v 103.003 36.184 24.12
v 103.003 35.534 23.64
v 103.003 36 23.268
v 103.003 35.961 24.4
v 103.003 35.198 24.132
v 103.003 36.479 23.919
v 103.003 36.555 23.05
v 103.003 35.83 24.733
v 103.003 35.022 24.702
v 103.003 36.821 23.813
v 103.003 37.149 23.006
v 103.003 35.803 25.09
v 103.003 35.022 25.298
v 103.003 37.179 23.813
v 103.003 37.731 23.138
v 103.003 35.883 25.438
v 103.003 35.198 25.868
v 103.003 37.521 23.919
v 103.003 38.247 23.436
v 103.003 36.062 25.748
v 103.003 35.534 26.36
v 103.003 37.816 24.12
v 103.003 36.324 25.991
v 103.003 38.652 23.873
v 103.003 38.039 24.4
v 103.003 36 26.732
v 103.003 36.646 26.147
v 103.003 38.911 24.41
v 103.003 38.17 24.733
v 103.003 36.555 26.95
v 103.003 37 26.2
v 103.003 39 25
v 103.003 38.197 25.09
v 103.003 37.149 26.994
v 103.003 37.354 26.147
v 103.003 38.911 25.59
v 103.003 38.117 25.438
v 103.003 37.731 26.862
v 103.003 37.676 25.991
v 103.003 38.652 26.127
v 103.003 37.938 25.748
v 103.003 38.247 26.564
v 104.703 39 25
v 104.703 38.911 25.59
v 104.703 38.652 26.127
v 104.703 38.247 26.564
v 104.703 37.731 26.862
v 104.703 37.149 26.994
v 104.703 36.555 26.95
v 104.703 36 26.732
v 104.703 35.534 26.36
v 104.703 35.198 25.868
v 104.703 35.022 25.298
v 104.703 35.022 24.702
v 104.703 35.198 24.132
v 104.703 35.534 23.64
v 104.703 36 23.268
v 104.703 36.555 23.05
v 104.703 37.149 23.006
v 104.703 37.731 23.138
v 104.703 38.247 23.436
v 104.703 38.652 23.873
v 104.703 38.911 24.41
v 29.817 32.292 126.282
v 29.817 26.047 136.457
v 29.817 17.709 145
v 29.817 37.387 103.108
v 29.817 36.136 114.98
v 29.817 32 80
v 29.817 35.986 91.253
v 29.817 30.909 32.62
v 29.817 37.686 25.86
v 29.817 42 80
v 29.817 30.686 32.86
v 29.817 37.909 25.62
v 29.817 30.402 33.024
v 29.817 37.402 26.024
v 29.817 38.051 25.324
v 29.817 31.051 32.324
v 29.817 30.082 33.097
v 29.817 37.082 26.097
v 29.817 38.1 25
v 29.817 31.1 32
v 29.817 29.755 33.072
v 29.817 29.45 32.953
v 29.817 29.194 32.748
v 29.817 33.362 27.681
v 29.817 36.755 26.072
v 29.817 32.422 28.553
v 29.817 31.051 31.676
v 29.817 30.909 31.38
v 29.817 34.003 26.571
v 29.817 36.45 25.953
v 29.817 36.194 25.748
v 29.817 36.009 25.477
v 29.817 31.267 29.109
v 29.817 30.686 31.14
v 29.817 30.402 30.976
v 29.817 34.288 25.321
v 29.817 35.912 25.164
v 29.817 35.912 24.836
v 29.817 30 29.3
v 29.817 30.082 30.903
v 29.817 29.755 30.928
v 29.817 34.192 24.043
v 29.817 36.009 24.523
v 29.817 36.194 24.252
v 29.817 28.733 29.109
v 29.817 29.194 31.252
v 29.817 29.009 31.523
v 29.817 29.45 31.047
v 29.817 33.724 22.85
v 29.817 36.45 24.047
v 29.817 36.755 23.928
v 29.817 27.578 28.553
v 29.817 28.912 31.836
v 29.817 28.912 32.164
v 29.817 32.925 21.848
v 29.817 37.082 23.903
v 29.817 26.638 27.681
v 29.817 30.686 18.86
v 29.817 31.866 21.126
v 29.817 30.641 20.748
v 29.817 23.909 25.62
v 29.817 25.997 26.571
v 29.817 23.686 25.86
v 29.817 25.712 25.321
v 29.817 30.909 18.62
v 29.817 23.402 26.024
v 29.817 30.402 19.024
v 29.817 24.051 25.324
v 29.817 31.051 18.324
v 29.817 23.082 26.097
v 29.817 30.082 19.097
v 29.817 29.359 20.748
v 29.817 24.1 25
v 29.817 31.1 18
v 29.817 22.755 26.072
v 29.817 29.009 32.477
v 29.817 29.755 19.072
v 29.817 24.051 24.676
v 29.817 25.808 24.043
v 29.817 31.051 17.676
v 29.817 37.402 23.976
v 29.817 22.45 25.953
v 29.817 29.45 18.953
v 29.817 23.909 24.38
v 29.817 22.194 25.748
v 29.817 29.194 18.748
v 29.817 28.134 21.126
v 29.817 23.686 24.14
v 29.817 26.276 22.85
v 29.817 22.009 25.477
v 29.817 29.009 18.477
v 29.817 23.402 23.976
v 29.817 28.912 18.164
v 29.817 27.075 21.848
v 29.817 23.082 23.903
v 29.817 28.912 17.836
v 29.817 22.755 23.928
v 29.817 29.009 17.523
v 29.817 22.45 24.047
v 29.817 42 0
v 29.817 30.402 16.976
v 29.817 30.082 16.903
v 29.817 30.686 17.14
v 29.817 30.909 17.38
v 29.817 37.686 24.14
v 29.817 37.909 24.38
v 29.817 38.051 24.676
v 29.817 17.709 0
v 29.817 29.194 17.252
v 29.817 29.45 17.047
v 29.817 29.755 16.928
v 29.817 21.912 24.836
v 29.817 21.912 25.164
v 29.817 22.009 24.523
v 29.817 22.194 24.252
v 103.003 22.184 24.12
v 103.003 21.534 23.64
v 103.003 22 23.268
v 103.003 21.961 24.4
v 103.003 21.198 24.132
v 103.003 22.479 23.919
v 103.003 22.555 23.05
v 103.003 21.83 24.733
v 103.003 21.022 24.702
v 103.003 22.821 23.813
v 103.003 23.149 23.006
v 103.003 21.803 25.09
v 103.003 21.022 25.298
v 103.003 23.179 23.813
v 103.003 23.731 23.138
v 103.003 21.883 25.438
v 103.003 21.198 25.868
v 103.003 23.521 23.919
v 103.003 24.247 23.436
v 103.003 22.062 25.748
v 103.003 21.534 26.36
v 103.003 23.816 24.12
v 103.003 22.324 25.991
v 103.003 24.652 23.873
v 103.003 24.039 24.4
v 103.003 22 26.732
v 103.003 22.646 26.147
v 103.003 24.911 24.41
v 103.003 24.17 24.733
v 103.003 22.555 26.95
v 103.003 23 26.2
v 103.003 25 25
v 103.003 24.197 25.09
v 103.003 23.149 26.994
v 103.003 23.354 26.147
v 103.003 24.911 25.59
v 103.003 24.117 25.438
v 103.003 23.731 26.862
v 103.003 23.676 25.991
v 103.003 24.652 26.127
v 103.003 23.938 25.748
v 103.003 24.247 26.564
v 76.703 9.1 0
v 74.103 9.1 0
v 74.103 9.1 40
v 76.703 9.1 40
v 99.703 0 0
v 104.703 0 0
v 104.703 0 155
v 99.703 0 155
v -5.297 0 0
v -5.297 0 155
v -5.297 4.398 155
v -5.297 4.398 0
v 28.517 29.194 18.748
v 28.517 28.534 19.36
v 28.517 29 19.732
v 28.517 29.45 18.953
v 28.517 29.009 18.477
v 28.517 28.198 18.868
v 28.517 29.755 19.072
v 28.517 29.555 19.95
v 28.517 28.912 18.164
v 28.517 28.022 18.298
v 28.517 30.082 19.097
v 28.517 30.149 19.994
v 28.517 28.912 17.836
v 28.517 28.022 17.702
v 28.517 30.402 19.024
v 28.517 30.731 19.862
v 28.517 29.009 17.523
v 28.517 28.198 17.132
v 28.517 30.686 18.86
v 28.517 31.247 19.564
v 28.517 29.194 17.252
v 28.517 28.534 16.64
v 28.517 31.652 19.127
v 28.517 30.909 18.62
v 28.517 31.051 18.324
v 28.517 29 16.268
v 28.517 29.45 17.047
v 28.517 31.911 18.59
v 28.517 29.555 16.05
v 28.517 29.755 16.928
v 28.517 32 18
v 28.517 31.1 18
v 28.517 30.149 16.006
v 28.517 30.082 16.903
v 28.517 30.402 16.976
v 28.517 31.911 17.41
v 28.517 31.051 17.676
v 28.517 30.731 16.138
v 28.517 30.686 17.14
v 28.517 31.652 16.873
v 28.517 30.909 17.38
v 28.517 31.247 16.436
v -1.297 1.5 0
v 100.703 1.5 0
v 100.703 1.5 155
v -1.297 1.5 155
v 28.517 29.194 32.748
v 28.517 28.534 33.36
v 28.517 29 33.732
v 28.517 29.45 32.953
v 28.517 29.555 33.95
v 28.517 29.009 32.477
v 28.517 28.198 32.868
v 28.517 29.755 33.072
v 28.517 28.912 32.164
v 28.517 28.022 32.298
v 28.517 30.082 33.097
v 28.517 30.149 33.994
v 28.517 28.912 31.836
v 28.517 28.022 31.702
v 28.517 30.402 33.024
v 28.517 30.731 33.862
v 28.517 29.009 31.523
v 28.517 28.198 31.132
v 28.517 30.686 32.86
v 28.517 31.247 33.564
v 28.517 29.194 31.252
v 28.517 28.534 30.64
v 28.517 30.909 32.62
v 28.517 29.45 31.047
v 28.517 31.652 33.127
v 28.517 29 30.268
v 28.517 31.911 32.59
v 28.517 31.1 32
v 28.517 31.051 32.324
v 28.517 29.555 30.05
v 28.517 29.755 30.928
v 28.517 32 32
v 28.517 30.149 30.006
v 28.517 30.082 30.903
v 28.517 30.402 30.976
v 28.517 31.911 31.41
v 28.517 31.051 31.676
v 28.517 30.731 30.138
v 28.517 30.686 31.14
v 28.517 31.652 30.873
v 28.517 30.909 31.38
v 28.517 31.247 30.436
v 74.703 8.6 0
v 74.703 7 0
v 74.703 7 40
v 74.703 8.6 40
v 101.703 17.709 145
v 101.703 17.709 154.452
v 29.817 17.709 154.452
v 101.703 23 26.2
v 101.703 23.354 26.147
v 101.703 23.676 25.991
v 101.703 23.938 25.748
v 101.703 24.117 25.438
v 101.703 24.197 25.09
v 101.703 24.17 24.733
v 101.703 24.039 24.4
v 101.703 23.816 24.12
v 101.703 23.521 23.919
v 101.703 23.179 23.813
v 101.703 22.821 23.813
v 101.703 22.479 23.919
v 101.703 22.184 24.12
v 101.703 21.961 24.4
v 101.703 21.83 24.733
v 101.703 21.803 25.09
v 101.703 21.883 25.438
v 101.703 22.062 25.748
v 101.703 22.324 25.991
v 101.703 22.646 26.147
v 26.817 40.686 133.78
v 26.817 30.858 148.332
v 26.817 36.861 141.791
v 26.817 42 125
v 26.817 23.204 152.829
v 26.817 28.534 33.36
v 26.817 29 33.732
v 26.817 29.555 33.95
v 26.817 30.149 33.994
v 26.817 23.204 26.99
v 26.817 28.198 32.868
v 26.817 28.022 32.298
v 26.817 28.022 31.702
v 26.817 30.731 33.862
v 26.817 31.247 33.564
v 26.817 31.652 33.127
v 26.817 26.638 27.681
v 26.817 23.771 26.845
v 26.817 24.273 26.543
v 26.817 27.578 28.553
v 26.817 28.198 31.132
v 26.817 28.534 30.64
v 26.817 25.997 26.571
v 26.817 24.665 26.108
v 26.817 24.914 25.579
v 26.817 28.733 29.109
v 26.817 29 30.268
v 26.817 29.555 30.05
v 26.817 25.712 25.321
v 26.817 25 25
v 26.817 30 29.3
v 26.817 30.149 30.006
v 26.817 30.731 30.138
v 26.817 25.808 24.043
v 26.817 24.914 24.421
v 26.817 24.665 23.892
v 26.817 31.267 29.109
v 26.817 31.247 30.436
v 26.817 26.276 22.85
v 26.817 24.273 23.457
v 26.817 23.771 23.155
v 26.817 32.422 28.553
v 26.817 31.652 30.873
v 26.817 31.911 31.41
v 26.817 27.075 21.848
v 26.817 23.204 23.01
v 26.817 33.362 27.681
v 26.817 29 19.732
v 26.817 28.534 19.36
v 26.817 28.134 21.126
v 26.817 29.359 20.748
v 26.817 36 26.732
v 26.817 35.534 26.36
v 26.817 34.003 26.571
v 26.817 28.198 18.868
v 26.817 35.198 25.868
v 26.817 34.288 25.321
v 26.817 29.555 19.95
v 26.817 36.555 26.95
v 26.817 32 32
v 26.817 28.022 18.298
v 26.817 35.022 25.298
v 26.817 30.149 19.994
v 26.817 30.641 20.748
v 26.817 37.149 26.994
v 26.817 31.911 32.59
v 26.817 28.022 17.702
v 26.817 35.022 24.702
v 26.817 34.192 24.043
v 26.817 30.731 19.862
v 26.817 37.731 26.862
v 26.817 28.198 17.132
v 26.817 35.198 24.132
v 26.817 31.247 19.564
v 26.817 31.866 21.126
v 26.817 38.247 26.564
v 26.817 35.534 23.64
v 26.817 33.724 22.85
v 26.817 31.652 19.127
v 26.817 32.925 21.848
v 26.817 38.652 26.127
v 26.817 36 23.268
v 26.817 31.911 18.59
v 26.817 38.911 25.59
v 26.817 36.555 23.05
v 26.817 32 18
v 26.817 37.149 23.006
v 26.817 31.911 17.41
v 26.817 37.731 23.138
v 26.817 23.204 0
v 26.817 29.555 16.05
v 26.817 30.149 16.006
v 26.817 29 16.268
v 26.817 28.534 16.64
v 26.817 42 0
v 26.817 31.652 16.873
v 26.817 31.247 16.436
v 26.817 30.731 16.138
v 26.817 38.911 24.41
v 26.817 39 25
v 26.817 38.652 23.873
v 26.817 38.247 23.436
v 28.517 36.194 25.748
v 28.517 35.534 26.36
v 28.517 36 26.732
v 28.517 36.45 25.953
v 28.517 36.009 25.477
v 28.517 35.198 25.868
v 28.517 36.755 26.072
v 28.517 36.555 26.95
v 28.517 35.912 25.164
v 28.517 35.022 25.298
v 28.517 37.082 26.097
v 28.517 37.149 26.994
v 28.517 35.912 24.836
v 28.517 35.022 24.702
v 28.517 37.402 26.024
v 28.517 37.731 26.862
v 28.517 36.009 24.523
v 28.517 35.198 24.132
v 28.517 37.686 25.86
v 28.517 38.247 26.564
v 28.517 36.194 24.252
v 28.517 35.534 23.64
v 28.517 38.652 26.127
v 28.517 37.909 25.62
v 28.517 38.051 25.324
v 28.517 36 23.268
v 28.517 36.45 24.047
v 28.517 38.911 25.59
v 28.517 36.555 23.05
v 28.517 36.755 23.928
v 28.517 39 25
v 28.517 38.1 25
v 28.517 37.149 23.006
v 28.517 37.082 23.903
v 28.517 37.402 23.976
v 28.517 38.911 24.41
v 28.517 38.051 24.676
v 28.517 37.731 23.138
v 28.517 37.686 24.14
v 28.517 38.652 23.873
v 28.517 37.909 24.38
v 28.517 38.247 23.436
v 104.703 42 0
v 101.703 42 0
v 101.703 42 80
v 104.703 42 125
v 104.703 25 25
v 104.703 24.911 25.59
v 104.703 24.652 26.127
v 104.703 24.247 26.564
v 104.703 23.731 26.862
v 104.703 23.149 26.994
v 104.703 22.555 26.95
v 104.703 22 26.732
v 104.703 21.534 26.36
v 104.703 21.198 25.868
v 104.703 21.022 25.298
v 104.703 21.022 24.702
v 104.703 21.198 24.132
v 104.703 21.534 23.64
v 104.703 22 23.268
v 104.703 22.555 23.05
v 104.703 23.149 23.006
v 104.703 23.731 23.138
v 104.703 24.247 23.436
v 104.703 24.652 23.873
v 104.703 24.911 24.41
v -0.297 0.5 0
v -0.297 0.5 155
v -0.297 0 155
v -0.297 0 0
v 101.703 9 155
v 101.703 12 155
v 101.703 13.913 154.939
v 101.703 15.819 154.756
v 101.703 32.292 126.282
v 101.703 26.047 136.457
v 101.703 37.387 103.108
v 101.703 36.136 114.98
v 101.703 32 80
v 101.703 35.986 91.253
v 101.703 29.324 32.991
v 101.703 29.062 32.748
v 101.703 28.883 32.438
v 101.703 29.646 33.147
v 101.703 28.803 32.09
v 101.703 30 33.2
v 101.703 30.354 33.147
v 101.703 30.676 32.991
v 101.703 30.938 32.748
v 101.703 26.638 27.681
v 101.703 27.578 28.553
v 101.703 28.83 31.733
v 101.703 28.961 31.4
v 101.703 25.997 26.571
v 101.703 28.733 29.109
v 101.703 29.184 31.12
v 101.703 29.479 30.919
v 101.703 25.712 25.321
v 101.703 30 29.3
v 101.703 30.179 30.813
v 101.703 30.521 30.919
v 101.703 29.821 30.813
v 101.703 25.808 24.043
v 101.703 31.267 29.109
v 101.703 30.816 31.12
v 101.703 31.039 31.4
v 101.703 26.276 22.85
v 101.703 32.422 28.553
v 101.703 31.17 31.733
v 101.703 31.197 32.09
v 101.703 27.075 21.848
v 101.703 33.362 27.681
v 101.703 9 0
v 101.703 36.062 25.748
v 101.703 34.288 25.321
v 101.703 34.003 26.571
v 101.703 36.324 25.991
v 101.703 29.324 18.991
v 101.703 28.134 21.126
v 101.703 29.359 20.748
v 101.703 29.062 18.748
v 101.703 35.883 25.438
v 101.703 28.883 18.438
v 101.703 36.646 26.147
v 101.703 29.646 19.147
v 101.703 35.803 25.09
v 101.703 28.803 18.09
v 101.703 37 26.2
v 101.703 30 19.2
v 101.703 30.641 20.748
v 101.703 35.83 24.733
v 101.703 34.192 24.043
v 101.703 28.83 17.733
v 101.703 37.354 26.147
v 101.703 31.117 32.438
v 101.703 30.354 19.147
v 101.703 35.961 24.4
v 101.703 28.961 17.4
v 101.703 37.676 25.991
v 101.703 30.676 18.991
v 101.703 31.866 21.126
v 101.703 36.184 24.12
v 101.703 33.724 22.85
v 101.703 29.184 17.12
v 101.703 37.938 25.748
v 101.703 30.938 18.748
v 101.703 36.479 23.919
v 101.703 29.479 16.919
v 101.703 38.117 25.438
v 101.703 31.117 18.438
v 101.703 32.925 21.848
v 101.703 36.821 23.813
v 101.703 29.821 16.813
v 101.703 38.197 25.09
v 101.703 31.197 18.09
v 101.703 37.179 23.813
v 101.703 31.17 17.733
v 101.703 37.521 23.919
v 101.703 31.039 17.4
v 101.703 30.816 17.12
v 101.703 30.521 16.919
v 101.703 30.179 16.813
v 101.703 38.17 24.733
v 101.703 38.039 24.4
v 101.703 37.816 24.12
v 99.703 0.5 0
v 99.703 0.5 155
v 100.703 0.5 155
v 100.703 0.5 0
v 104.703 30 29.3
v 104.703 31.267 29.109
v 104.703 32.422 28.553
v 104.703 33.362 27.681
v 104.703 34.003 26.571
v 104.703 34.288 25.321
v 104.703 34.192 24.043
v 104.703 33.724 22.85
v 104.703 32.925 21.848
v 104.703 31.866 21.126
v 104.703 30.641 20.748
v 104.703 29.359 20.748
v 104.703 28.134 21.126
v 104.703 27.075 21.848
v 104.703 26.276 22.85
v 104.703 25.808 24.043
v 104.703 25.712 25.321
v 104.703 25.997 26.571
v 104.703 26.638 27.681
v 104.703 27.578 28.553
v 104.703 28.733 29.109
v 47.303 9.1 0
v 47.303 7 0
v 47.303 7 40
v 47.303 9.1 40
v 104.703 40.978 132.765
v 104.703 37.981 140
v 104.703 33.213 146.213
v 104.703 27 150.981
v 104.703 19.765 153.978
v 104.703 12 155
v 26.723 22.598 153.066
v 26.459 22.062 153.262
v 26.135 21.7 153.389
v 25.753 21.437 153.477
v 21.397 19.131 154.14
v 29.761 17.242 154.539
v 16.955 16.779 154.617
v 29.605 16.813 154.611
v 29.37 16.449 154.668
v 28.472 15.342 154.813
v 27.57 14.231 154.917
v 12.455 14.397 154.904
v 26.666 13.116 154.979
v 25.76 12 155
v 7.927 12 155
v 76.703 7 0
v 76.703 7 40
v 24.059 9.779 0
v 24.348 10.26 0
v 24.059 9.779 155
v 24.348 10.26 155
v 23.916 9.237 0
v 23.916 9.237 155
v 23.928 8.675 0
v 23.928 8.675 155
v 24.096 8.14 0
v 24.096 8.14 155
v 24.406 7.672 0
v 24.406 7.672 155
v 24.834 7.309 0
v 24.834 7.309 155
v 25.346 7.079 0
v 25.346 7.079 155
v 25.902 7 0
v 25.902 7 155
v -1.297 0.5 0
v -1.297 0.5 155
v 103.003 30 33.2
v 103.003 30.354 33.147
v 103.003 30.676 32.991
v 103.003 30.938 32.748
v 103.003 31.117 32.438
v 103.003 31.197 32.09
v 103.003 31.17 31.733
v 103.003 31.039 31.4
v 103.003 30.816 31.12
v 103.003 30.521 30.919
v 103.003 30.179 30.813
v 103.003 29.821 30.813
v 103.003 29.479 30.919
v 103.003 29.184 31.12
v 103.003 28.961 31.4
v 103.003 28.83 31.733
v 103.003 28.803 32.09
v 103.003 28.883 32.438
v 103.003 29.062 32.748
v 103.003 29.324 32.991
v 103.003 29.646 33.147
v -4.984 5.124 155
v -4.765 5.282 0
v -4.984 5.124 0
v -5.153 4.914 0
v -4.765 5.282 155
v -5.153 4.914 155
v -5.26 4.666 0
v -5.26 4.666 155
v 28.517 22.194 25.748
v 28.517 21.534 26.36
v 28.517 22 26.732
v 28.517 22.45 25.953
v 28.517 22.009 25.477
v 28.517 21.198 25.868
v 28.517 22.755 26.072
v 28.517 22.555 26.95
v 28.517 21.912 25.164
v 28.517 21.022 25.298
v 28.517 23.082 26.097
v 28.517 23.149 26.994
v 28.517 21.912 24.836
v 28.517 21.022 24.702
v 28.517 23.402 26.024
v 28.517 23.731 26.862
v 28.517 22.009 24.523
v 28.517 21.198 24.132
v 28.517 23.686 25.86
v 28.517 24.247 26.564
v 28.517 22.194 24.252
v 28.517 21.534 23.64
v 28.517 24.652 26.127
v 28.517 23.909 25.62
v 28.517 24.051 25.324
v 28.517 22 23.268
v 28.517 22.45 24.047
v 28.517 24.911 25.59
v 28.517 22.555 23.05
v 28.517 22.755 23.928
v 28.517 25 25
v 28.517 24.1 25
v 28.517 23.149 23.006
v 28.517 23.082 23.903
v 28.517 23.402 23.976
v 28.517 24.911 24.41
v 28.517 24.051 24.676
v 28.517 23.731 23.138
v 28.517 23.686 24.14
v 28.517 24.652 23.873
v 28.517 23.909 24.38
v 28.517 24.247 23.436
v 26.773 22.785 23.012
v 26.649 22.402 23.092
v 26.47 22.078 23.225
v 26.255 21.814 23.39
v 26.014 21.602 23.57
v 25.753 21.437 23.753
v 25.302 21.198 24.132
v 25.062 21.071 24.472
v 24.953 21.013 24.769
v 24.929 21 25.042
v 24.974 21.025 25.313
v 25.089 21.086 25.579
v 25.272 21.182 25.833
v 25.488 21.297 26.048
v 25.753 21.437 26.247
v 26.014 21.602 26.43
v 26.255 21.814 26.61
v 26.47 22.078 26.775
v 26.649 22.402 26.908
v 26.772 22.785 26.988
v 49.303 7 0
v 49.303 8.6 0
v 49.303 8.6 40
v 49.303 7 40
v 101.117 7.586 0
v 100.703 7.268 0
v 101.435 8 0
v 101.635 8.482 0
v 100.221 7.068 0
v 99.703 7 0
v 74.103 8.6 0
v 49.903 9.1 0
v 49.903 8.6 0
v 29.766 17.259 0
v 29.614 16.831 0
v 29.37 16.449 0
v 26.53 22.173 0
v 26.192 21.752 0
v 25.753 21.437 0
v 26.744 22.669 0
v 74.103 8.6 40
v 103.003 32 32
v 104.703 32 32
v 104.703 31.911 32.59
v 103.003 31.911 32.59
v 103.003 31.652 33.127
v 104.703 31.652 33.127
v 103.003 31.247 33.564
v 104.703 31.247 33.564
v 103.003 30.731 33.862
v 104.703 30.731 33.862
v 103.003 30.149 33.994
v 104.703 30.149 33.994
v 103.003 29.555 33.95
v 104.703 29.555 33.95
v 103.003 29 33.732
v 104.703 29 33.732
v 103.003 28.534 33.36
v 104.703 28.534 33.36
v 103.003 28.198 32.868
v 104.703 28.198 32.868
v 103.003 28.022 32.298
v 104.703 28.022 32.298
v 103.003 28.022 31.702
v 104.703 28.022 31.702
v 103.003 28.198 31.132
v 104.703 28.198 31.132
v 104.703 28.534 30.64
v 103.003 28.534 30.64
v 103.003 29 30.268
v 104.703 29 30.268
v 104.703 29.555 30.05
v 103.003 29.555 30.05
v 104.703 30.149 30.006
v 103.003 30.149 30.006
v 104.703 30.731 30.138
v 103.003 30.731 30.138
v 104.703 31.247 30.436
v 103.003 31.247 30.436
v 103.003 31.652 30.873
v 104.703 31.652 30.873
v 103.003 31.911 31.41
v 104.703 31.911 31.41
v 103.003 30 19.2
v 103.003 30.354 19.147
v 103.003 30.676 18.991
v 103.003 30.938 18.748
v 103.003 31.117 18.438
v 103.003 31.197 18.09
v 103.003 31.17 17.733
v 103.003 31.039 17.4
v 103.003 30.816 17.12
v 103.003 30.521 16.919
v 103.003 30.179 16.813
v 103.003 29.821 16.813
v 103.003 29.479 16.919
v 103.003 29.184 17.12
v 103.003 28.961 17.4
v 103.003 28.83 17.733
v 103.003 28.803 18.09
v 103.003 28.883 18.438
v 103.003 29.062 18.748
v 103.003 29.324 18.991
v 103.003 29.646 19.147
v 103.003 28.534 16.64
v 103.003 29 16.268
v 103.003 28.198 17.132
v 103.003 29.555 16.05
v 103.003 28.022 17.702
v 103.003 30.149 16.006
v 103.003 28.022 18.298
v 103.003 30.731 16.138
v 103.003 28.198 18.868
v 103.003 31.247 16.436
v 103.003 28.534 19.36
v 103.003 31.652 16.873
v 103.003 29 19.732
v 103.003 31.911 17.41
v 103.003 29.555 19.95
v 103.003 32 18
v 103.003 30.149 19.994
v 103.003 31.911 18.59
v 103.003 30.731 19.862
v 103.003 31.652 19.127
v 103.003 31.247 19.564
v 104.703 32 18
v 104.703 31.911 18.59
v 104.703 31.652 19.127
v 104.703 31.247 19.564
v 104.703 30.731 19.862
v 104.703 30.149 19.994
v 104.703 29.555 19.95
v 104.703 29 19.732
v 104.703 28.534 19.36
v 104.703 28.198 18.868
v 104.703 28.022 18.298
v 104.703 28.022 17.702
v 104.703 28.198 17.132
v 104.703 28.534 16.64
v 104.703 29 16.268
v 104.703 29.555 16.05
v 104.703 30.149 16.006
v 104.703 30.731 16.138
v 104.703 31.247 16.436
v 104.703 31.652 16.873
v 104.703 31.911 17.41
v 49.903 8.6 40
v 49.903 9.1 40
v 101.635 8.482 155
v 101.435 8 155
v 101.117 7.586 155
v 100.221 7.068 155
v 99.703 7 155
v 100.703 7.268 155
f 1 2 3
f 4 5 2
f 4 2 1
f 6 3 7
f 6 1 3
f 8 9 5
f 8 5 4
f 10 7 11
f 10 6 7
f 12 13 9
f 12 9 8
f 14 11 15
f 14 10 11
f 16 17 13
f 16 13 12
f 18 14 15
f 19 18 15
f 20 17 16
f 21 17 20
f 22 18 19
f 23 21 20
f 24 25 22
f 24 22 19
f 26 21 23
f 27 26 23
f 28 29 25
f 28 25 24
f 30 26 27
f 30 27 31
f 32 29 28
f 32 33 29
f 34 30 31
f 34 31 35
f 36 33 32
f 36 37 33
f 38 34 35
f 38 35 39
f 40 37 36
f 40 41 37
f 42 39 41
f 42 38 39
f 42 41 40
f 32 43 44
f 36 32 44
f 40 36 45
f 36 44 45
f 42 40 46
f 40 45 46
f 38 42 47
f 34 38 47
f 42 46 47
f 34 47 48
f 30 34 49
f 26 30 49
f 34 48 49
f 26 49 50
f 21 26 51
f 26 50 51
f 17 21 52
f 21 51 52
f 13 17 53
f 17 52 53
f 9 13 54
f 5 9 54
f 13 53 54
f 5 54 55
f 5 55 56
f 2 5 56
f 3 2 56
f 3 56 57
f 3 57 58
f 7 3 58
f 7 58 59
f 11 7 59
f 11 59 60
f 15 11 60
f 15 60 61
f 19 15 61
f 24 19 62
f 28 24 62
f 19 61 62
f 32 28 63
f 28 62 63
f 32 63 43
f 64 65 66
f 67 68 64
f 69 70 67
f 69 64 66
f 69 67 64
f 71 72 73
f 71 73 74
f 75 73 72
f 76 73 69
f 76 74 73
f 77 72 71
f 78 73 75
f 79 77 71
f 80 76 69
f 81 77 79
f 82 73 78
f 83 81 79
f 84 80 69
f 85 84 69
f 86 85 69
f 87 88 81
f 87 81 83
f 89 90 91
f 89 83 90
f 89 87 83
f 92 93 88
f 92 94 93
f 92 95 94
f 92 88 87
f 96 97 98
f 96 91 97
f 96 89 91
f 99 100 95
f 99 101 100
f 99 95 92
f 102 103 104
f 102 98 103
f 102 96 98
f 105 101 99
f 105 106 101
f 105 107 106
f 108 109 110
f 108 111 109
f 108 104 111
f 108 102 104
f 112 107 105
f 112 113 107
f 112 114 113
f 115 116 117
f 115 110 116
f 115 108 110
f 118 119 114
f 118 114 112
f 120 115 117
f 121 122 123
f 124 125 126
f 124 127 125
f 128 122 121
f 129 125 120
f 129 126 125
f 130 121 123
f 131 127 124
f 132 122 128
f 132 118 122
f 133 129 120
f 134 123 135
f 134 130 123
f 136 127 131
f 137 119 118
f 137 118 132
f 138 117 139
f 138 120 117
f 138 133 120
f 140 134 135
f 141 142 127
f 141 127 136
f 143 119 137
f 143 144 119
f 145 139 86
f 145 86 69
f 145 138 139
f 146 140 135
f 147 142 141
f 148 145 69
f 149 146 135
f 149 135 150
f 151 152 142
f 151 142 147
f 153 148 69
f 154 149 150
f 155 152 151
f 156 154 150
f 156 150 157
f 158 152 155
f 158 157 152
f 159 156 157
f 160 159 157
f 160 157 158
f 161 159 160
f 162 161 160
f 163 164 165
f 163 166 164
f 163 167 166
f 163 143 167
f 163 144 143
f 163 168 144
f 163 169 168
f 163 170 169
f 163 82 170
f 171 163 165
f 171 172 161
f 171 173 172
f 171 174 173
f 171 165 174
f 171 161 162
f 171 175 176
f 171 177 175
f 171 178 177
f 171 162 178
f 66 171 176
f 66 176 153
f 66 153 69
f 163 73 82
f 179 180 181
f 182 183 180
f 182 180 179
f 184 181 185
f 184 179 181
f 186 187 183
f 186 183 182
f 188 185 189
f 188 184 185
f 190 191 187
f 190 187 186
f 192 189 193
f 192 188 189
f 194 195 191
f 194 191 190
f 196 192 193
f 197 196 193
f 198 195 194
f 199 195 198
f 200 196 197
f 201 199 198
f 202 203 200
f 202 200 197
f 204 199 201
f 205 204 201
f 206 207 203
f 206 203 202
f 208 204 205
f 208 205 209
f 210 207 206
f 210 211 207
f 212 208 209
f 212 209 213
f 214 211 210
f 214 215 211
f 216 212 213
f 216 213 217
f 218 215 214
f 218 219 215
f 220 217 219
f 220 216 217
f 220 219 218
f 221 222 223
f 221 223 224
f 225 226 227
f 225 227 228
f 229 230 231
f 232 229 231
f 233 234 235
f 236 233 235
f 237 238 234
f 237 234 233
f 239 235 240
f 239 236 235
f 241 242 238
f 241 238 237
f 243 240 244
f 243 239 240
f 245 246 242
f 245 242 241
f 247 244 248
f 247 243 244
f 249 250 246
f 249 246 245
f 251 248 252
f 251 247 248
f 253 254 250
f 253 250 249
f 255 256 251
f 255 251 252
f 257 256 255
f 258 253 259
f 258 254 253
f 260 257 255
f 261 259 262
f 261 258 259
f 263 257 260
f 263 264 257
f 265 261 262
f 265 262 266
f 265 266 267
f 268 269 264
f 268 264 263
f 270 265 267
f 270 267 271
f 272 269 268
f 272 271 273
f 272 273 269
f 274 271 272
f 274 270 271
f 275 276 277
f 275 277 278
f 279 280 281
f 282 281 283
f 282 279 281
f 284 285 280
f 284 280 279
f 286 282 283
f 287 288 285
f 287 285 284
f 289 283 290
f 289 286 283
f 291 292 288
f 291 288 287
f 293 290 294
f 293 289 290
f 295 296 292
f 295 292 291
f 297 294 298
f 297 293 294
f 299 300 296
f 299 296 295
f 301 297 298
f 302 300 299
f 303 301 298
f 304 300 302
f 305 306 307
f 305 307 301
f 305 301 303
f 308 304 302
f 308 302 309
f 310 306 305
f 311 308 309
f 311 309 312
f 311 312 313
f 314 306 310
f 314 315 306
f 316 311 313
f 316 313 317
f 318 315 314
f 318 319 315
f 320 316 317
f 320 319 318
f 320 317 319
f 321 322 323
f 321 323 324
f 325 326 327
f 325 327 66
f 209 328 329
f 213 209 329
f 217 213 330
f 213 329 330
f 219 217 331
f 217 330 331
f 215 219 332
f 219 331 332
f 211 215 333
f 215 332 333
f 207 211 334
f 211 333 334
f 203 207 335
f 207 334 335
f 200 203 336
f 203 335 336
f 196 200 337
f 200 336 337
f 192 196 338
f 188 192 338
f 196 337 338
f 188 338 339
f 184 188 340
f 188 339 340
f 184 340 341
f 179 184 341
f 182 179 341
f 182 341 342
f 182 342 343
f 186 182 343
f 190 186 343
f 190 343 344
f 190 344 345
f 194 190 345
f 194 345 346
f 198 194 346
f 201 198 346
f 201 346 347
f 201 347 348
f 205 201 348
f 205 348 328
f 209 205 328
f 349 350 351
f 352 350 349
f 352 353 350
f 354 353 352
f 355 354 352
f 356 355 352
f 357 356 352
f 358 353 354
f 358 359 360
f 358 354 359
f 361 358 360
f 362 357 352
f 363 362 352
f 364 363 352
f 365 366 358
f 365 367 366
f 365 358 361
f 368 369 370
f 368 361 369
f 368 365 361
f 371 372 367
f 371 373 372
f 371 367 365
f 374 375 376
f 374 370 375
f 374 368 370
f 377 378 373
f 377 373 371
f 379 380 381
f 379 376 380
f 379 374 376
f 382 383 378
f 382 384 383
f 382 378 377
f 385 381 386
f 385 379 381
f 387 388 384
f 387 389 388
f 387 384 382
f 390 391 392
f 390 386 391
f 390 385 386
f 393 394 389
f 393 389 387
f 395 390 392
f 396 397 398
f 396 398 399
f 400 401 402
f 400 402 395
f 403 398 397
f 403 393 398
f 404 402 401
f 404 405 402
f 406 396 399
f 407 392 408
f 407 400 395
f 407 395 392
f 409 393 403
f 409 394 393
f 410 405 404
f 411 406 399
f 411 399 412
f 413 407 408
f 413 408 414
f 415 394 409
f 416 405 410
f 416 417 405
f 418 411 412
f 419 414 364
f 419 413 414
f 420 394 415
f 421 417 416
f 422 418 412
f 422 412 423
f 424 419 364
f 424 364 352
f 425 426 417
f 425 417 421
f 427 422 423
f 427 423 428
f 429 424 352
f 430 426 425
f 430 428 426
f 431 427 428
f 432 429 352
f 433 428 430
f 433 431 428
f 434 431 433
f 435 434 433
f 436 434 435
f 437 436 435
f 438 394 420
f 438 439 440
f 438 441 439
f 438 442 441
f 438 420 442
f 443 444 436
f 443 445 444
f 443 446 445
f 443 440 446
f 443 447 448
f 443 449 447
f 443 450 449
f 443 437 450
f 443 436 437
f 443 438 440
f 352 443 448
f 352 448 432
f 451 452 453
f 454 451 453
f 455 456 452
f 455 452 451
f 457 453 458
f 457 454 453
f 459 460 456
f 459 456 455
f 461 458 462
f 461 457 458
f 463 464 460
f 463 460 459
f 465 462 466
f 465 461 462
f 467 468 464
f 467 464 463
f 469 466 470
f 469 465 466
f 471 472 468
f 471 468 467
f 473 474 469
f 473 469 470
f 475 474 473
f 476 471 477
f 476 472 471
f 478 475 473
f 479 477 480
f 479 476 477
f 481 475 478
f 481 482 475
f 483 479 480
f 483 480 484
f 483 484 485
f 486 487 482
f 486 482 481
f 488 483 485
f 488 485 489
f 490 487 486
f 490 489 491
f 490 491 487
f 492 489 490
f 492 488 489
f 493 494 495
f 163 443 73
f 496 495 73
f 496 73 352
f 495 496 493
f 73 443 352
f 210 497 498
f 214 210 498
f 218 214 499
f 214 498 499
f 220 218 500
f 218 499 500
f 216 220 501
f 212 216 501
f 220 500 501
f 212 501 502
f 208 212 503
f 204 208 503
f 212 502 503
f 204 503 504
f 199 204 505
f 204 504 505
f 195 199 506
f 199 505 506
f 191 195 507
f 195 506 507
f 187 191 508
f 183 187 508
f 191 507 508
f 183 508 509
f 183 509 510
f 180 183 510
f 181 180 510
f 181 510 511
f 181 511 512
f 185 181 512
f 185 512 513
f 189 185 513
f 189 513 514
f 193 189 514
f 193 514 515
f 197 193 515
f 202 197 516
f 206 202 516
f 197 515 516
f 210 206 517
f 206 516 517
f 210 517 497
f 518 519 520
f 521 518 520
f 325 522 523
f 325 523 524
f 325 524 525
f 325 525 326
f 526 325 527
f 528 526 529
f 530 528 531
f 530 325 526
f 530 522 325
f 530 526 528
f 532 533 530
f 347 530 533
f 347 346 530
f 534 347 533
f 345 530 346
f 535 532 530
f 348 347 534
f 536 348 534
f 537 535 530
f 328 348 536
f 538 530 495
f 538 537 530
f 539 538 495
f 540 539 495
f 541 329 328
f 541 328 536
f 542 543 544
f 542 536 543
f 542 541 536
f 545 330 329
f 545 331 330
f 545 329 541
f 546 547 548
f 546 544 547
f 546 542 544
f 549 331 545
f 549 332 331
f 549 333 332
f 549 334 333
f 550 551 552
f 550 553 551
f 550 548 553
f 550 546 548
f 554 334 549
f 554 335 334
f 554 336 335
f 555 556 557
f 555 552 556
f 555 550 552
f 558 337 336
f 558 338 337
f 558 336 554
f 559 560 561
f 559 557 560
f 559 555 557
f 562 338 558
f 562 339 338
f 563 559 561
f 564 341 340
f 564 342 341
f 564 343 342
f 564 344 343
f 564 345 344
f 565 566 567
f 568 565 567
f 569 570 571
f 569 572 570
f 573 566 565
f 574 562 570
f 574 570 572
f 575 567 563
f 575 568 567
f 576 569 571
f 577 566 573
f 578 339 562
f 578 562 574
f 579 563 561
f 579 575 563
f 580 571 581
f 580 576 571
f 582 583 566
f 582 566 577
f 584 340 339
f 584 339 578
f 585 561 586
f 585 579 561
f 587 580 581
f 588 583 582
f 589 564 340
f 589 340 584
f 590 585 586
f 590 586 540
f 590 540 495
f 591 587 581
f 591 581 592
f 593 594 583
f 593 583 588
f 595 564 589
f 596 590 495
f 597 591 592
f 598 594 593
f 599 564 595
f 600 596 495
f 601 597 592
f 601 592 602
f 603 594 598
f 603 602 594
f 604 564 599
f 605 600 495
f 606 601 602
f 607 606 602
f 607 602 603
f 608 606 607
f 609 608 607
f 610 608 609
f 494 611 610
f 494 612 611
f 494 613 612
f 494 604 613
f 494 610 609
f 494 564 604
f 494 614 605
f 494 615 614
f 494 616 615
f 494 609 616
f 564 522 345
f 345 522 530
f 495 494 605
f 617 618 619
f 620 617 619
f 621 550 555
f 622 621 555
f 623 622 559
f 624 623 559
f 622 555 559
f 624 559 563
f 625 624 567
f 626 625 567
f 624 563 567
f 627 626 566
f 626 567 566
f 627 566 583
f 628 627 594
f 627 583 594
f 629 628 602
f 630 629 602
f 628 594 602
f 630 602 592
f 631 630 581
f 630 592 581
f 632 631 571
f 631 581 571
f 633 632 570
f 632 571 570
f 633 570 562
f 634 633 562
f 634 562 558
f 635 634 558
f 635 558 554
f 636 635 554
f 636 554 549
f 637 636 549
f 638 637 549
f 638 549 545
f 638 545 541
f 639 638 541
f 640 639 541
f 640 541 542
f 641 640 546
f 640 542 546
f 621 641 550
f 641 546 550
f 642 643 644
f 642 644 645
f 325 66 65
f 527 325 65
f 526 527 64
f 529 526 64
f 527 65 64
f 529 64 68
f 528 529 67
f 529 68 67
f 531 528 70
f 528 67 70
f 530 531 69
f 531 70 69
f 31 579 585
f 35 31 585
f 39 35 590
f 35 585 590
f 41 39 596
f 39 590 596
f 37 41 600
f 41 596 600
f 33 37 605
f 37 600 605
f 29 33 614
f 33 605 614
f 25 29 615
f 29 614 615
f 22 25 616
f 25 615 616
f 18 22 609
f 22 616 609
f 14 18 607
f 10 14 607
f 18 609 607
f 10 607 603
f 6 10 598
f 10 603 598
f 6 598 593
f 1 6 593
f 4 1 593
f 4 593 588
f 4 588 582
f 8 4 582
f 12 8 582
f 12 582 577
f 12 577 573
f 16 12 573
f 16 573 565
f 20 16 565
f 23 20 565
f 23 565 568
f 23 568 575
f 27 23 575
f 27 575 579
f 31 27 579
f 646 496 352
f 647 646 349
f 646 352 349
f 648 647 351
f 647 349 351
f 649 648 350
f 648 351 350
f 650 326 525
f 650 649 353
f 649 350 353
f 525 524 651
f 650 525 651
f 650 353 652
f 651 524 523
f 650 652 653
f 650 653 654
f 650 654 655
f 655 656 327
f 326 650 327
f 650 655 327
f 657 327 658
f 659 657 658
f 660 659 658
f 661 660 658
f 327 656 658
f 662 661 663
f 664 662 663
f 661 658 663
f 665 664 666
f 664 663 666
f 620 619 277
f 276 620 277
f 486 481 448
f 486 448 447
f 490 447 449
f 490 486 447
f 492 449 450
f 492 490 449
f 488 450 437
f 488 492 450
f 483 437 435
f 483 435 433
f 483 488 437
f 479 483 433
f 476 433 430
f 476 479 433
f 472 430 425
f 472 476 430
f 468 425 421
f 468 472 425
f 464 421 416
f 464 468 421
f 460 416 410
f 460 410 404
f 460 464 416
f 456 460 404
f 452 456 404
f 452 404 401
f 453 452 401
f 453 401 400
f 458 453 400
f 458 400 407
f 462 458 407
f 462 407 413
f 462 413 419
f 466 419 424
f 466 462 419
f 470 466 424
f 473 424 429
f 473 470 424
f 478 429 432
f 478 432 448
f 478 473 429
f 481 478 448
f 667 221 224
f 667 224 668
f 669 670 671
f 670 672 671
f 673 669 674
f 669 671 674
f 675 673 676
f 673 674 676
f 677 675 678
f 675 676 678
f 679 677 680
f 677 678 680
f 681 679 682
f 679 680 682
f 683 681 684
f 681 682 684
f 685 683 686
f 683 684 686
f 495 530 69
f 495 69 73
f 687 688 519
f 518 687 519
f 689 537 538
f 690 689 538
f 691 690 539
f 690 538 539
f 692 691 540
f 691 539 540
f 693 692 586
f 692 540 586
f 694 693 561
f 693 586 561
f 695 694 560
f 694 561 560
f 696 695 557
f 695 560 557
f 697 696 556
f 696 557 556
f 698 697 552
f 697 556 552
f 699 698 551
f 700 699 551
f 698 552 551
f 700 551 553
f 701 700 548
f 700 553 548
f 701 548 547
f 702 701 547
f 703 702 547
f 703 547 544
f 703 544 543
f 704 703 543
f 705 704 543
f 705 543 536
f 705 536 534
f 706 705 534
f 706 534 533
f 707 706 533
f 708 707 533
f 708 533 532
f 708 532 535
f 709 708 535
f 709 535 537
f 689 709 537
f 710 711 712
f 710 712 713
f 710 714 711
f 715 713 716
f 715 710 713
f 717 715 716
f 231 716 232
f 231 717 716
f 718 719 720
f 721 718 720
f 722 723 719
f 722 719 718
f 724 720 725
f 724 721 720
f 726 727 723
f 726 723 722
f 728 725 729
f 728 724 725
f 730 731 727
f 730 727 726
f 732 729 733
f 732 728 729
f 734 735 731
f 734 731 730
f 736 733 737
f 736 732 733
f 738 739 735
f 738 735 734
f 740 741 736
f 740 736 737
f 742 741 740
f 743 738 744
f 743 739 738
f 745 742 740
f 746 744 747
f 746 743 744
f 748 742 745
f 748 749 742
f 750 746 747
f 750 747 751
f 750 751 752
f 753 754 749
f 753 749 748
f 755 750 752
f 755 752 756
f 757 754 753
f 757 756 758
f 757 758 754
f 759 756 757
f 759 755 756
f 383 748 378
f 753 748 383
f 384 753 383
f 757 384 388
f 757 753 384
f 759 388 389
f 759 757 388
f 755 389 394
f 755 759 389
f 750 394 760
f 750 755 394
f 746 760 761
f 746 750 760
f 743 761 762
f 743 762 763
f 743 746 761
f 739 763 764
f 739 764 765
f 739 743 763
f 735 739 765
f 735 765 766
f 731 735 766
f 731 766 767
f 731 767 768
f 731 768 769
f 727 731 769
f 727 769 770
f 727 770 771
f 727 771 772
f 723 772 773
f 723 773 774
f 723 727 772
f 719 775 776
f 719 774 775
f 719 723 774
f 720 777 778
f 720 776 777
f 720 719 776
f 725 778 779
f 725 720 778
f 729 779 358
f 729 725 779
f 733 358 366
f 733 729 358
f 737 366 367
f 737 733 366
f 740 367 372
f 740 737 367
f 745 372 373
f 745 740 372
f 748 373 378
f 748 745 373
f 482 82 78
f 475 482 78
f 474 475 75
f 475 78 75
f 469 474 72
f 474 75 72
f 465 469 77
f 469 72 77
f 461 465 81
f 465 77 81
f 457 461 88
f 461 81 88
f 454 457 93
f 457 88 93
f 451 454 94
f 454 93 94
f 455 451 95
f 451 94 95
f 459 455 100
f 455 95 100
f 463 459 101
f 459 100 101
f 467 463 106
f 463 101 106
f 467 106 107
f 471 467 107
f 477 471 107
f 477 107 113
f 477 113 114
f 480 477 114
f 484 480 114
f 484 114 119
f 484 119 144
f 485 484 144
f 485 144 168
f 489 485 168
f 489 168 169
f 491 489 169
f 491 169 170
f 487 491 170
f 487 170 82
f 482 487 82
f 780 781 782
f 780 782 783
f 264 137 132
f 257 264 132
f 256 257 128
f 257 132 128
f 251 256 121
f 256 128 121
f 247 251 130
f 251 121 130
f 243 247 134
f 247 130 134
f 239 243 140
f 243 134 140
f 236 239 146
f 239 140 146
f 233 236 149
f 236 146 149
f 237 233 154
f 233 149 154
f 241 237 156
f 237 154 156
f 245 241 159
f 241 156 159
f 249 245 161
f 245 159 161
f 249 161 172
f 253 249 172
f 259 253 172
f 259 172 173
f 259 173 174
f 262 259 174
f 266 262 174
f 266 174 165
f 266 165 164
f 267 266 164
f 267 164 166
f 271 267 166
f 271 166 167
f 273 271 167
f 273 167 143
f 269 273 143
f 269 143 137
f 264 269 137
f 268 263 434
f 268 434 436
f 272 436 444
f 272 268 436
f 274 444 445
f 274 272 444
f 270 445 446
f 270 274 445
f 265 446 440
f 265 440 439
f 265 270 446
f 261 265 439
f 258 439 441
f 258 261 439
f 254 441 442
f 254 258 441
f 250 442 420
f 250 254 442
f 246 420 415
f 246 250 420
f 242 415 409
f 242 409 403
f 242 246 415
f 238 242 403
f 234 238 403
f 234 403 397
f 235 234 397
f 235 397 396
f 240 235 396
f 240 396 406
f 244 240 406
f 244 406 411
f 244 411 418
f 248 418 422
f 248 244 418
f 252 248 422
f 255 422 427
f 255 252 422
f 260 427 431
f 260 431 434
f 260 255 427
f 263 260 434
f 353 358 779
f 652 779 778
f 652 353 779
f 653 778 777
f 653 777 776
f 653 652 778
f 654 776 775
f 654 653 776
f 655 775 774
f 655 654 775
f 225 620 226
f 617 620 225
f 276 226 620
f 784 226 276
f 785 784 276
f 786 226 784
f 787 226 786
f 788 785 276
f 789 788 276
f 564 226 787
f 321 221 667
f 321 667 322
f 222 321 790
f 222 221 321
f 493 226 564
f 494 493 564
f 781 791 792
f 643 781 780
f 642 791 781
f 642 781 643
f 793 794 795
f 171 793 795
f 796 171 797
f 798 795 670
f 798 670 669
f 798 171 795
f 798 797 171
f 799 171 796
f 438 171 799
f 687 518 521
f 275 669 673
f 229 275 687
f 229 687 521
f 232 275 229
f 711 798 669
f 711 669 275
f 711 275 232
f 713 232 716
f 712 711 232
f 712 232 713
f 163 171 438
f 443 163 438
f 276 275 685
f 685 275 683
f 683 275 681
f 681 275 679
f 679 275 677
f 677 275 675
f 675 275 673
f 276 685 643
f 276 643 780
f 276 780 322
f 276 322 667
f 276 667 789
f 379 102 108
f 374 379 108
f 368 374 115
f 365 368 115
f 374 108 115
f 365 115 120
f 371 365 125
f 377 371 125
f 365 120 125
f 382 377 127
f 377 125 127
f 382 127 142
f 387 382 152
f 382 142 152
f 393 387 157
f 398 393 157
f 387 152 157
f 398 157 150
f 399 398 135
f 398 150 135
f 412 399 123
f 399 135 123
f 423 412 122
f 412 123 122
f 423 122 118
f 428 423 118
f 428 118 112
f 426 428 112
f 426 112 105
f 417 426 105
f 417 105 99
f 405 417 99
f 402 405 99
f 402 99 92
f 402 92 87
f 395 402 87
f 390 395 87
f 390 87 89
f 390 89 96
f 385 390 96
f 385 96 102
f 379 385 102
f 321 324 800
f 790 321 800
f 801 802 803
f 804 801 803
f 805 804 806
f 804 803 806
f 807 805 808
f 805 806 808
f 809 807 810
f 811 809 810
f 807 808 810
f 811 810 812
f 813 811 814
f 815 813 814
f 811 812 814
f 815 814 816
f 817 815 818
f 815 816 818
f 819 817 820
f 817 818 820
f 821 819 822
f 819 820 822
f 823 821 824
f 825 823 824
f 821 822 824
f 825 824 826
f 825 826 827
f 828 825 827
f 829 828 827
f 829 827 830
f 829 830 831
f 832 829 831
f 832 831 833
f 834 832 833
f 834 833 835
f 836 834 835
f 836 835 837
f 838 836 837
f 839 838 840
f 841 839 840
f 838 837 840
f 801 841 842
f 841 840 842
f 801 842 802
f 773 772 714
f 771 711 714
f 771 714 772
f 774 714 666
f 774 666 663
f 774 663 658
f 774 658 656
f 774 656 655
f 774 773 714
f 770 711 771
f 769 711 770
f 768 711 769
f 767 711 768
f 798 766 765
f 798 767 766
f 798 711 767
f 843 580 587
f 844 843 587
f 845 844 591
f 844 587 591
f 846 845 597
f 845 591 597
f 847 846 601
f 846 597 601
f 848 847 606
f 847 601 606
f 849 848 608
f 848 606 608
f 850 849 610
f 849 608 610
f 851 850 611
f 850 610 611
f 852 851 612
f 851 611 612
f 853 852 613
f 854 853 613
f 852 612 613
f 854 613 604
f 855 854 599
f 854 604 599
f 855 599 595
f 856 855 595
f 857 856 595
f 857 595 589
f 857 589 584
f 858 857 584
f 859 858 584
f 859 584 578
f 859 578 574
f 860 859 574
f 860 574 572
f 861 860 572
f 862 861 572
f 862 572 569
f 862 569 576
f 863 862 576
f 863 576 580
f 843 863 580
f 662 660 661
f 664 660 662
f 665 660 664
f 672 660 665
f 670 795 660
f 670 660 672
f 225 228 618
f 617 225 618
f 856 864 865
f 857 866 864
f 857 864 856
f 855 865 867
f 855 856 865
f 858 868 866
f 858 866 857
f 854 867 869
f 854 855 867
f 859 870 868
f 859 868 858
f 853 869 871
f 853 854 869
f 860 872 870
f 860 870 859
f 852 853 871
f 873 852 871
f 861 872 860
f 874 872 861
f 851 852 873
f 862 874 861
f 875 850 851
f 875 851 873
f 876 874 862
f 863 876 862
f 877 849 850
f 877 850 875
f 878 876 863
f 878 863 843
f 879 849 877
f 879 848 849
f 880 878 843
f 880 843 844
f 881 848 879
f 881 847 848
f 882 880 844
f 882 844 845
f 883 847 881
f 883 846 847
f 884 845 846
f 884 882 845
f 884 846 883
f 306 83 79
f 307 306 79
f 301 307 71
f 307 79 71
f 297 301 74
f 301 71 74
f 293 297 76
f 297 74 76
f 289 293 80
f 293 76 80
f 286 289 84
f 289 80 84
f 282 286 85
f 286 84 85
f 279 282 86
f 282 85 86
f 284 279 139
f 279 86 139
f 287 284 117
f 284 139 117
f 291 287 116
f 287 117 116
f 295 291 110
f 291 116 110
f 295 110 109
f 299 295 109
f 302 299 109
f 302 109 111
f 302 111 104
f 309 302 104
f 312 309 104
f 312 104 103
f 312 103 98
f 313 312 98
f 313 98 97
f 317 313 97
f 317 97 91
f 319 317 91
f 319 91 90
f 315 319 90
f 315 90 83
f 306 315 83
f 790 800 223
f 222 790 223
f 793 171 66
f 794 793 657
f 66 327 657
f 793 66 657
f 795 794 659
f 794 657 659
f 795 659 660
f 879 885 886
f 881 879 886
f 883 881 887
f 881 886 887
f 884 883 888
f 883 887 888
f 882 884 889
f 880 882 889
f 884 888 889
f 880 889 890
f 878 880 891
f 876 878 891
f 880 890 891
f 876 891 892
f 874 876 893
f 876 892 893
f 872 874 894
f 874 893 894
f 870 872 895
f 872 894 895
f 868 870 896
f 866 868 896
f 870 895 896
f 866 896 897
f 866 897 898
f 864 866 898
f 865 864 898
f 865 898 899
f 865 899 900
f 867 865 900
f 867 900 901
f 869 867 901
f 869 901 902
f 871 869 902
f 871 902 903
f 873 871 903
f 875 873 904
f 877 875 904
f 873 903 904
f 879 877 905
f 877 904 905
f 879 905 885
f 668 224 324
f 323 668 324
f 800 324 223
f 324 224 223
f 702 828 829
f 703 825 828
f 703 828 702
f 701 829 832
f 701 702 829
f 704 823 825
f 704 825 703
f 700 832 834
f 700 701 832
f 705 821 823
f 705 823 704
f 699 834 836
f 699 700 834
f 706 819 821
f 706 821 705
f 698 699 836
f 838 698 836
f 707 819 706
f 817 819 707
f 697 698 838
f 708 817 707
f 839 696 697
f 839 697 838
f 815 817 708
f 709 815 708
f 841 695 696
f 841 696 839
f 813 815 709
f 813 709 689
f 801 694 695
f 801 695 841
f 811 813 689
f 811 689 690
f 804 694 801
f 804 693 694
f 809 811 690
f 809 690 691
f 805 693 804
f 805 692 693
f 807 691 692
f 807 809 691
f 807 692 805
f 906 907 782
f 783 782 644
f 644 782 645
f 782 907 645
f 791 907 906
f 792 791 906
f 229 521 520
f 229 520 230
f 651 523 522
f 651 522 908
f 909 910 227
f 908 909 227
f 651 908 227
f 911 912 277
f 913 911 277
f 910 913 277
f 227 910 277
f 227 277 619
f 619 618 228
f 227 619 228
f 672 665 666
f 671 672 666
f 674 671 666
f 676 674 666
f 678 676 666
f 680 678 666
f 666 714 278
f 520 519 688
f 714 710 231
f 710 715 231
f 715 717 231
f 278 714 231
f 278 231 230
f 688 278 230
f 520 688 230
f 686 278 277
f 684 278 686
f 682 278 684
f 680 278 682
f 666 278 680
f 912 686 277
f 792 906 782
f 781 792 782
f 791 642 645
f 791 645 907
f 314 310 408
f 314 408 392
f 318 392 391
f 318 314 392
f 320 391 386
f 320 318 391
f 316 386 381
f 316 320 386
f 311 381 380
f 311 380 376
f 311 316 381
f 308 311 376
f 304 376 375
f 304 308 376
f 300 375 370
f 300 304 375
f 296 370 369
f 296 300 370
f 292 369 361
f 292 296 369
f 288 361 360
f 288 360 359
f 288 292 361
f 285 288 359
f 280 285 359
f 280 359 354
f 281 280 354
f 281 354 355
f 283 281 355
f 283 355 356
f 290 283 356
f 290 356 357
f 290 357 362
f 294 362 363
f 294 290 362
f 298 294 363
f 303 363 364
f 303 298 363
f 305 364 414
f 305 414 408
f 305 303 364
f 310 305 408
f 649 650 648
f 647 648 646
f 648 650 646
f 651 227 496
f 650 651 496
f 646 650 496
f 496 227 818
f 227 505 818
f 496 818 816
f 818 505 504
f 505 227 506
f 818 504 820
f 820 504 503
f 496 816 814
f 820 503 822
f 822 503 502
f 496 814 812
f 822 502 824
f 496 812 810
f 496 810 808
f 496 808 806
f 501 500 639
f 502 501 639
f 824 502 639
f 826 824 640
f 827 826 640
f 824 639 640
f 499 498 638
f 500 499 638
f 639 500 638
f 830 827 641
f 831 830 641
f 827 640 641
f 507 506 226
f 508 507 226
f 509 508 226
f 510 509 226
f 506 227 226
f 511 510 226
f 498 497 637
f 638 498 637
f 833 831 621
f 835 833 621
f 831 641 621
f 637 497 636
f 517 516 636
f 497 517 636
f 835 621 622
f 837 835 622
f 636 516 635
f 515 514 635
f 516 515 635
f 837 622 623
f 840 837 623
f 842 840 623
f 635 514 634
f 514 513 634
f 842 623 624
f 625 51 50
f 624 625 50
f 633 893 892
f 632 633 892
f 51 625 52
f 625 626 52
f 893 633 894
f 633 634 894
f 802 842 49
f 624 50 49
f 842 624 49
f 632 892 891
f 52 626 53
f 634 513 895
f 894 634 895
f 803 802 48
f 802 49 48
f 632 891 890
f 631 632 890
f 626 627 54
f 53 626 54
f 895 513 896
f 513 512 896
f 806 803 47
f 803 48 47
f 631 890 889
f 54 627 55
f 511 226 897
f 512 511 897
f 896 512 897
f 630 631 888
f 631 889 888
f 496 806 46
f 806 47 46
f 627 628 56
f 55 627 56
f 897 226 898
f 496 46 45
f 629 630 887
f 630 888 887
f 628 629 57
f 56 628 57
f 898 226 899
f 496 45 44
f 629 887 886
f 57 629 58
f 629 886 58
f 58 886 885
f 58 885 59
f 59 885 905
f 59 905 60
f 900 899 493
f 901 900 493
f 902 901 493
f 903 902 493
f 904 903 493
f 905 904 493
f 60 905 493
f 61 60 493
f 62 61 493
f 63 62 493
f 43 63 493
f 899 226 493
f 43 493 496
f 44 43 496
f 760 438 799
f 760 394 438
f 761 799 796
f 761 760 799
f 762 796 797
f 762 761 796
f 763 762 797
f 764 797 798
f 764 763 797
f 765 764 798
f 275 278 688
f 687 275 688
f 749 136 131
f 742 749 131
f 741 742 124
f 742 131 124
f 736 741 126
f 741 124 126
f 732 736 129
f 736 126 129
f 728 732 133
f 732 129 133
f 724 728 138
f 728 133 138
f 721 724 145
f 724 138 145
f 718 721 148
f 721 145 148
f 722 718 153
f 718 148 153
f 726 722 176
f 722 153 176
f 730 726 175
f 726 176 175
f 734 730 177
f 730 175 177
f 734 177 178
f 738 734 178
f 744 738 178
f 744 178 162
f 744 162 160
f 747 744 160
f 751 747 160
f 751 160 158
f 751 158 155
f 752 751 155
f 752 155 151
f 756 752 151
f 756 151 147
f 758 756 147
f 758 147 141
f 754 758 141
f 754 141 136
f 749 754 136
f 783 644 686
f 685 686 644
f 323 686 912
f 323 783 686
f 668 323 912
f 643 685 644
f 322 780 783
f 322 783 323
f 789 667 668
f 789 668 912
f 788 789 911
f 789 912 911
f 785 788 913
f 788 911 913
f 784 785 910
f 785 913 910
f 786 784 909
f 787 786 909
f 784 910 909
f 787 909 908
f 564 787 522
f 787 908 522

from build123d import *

# Parameters (mm, degrees)
BOSS_EXTRUDE1_DEPTH = 155
SKETCH3_R           = 4.3
SKETCH3_R_2         = 1.2
CUT_EXTRUDE1_DEPTH  = 3
SKETCH2_R           = 4.3
SKETCH2_R_2         = 1.1
CUT_EXTRUDE2_DEPTH  = 178.191866295
SKETCH4_R           = 2
CUT_EXTRUDE3_DEPTH  = 1.7
CUT_EXTRUDE4_START  = -1.7
SKETCH5_R           = 2
CUT_EXTRUDE4_DEPTH  = 1.7
CUT_EXTRUDE5_START  = -1.7
SKETCH5_4_R         = 2
CUT_EXTRUDE5_DEPTH  = 181.180461853
FILLET1_R           = 2
FILLET2_R           = 1
BOSS_EXTRUDE3_DEPTH = 71.886297018
FILLET3_R           = 30
BOSS_EXTRUDE4_DEPTH = 40


with BuildPart() as part:
    # Sketch1 → Boss-Extrude1 (new body)
    with BuildSketch(Plane.XY):
        Polygon((29.816959294, 42), (29.816959294, 17), (21.703256312, 7), (101.703256312, 7), (101.703256312, 42), (104.703256312, 42), (104.703256312, 14.387755102), (104.703256312, 0), (99.703256312, 0), (99.703256312, 0.5), (100.703256312, 0.5), (100.703256312, 1.5), (-1.296743688, 1.5), (-1.296743688, 0.5), (-0.296743688, 0.5), (-0.296743688, 0), (-5.296743688, 0), (-5.296743688, 5), (26.816959294, 22), (26.816959294, 42), align=None)
    extrude(amount=BOSS_EXTRUDE1_DEPTH)

    # Sketch3 → Cut-Extrude1 (cut)
    with BuildSketch(Plane.ZY.offset(-101.703256312)):
        with Locations((25, 30)):
            Circle(SKETCH3_R)
        with Locations((25, 37)):
            Circle(SKETCH3_R_2)
        with Locations((32, 30)):
            Circle(SKETCH3_R_2)
        with Locations((25, 23)):
            Circle(SKETCH3_R_2)
        with Locations((18, 30)):
            Circle(SKETCH3_R_2)
    extrude(amount=-CUT_EXTRUDE1_DEPTH, mode=Mode.SUBTRACT)

    # Sketch2 → Cut-Extrude2 (cut, through all)
    with BuildSketch(Plane(origin=(29.816959294, 0, 0), x_dir=(0, 0, -1), z_dir=(1, 0, 0))):
        with Locations(Location((-25, 30, 0), (0, 0, 180))):
            Circle(SKETCH2_R)
        with Locations(Location((-25, 37, 0), (0, 0, 90))):
            Circle(SKETCH2_R_2)
        with Locations(Location((-18, 30, 0), (0, 0, 90))):
            Circle(SKETCH2_R_2)
        with Locations(Location((-25, 23, 0), (0, 0, 90))):
            Circle(SKETCH2_R_2)
        with Locations(Location((-32, 30, 0), (0, 0, 90))):
            Circle(SKETCH2_R_2)
    extrude(amount=-CUT_EXTRUDE2_DEPTH, mode=Mode.SUBTRACT)

    # Sketch4 → Cut-Extrude3 (cut)
    with BuildSketch(Plane(origin=(104.703256312, 0, 0), x_dir=(0, 0, -1), z_dir=(1, 0, 0))):
        with Locations(Location((-32, 30, 0), (0, 0, 90))):
            Circle(SKETCH4_R)
        with Locations(Location((-25, 37, 0), (0, 0, 90))):
            Circle(SKETCH4_R)
        with Locations(Location((-18, 30, 0), (0, 0, 90))):
            Circle(SKETCH4_R)
        with Locations(Location((-25, 23, 0), (0, 0, 90))):
            Circle(SKETCH4_R)
    extrude(amount=-CUT_EXTRUDE3_DEPTH, mode=Mode.SUBTRACT)

    # Sketch5 → Cut-Extrude4 (cut)
    with BuildSketch(Plane.ZY.offset(-26.816959294).offset(CUT_EXTRUDE4_START)):
        with Locations(Location((25, 23, 0), (0, 0, 90))):
            Circle(SKETCH5_R)
        with Locations(Location((32, 30, 0), (0, 0, 90))):
            Circle(SKETCH5_R)
        with Locations(Location((25, 37, 0), (0, 0, 90))):
            Circle(SKETCH5_R)
        with Locations(Location((18, 30, 0), (0, 0, 90))):
            Circle(SKETCH5_R)
    extrude(amount=CUT_EXTRUDE4_DEPTH, mode=Mode.SUBTRACT)

    # Sketch5<4> → Cut-Extrude5 (cut, through all)
    with BuildSketch(Plane.ZY.offset(-26.816959294).offset(CUT_EXTRUDE5_START)):
        with Locations(Location((25, 23, 0), (0, 0, 90))):
            Circle(SKETCH5_4_R)
        with Locations(Location((32, 30, 0), (0, 0, 90))):
            Circle(SKETCH5_4_R)
        with Locations(Location((25, 37, 0), (0, 0, 90))):
            Circle(SKETCH5_4_R)
        with Locations(Location((18, 30, 0), (0, 0, 90))):
            Circle(SKETCH5_4_R)
    extrude(amount=CUT_EXTRUDE5_DEPTH, mode=Mode.SUBTRACT)

    # Fillet1
    fillet1_edges = [part.edges().sort_by_distance(p)[0] for p in [
        (101.703256312, 7, 77.5),
        (29.816959294, 17, 77.5),
        (21.703256312, 7, 77.5),
        (26.816959294, 22, 11.633974596),
        (26.816959294, 22, 90.866025404),
    ]]
    fillet(fillet1_edges, radius=FILLET1_R)

    # Fillet2
    fillet2_edges = [part.edges().sort_by_distance(p)[0] for p in [
        (-5.296743688, 5, 77.5),
    ]]
    fillet(fillet2_edges, radius=FILLET2_R)

    # Sketch8 → Boss-Extrude3 (add)
    with BuildSketch(Plane(origin=(29.816959294, 0, 0), x_dir=(0, 0, -1), z_dir=(1, 0, 0))):
        with BuildLine():
            Line((-155, 42), (-155, 17.709314663))
            Line((-155, 17.709314663), (-145, 17.709314663))
            ThreePointArc((-145, 17.709314663), (-114.980171869, 36.135513896), (-80, 32))
            Line((-80, 32), (-80, 42))
            Line((-80, 42), (-155, 42))
        make_face()
    extrude(amount=BOSS_EXTRUDE3_DEPTH)

    # Fillet3
    # the kernel refuses this fillet: 30 mm, written as the material it takes off along each edge
    with BuildSketch(Plane(origin=(-48.183040706, 42, 155), x_dir=(0, -1, 0), z_dir=(1, 0, 0))) as fillet3_piece_1:
        with BuildLine():
            CenterArc((FILLET3_R, FILLET3_R), FILLET3_R, 180, 90)
            Line((0, FILLET3_R), (0, 0))
            Line((0, 0), (FILLET3_R, 0))
        make_face()
    extrude(amount=227.886297018, mode=Mode.SUBTRACT)

    # Sketch10 → Boss-Extrude4 (add)
    with BuildSketch(Plane(origin=(0, 0, 0), x_dir=(-1, 0, 0), z_dir=(0, 0, -1))):
        Polygon((-74.703256312, 7), (-74.703256312, 8.6), (-74.103256312, 8.6), (-74.103256312, 9.1), (-76.703256312, 9.1), (-76.703256312, 7), align=None)
        Polygon((-47.303256312, 7), (-47.303256312, 9.1), (-49.903256312, 9.1), (-49.903256312, 8.6), (-49.303256312, 8.6), (-49.303256312, 7), align=None)
    extrude(amount=-BOSS_EXTRUDE4_DEPTH)


solid = part.part
